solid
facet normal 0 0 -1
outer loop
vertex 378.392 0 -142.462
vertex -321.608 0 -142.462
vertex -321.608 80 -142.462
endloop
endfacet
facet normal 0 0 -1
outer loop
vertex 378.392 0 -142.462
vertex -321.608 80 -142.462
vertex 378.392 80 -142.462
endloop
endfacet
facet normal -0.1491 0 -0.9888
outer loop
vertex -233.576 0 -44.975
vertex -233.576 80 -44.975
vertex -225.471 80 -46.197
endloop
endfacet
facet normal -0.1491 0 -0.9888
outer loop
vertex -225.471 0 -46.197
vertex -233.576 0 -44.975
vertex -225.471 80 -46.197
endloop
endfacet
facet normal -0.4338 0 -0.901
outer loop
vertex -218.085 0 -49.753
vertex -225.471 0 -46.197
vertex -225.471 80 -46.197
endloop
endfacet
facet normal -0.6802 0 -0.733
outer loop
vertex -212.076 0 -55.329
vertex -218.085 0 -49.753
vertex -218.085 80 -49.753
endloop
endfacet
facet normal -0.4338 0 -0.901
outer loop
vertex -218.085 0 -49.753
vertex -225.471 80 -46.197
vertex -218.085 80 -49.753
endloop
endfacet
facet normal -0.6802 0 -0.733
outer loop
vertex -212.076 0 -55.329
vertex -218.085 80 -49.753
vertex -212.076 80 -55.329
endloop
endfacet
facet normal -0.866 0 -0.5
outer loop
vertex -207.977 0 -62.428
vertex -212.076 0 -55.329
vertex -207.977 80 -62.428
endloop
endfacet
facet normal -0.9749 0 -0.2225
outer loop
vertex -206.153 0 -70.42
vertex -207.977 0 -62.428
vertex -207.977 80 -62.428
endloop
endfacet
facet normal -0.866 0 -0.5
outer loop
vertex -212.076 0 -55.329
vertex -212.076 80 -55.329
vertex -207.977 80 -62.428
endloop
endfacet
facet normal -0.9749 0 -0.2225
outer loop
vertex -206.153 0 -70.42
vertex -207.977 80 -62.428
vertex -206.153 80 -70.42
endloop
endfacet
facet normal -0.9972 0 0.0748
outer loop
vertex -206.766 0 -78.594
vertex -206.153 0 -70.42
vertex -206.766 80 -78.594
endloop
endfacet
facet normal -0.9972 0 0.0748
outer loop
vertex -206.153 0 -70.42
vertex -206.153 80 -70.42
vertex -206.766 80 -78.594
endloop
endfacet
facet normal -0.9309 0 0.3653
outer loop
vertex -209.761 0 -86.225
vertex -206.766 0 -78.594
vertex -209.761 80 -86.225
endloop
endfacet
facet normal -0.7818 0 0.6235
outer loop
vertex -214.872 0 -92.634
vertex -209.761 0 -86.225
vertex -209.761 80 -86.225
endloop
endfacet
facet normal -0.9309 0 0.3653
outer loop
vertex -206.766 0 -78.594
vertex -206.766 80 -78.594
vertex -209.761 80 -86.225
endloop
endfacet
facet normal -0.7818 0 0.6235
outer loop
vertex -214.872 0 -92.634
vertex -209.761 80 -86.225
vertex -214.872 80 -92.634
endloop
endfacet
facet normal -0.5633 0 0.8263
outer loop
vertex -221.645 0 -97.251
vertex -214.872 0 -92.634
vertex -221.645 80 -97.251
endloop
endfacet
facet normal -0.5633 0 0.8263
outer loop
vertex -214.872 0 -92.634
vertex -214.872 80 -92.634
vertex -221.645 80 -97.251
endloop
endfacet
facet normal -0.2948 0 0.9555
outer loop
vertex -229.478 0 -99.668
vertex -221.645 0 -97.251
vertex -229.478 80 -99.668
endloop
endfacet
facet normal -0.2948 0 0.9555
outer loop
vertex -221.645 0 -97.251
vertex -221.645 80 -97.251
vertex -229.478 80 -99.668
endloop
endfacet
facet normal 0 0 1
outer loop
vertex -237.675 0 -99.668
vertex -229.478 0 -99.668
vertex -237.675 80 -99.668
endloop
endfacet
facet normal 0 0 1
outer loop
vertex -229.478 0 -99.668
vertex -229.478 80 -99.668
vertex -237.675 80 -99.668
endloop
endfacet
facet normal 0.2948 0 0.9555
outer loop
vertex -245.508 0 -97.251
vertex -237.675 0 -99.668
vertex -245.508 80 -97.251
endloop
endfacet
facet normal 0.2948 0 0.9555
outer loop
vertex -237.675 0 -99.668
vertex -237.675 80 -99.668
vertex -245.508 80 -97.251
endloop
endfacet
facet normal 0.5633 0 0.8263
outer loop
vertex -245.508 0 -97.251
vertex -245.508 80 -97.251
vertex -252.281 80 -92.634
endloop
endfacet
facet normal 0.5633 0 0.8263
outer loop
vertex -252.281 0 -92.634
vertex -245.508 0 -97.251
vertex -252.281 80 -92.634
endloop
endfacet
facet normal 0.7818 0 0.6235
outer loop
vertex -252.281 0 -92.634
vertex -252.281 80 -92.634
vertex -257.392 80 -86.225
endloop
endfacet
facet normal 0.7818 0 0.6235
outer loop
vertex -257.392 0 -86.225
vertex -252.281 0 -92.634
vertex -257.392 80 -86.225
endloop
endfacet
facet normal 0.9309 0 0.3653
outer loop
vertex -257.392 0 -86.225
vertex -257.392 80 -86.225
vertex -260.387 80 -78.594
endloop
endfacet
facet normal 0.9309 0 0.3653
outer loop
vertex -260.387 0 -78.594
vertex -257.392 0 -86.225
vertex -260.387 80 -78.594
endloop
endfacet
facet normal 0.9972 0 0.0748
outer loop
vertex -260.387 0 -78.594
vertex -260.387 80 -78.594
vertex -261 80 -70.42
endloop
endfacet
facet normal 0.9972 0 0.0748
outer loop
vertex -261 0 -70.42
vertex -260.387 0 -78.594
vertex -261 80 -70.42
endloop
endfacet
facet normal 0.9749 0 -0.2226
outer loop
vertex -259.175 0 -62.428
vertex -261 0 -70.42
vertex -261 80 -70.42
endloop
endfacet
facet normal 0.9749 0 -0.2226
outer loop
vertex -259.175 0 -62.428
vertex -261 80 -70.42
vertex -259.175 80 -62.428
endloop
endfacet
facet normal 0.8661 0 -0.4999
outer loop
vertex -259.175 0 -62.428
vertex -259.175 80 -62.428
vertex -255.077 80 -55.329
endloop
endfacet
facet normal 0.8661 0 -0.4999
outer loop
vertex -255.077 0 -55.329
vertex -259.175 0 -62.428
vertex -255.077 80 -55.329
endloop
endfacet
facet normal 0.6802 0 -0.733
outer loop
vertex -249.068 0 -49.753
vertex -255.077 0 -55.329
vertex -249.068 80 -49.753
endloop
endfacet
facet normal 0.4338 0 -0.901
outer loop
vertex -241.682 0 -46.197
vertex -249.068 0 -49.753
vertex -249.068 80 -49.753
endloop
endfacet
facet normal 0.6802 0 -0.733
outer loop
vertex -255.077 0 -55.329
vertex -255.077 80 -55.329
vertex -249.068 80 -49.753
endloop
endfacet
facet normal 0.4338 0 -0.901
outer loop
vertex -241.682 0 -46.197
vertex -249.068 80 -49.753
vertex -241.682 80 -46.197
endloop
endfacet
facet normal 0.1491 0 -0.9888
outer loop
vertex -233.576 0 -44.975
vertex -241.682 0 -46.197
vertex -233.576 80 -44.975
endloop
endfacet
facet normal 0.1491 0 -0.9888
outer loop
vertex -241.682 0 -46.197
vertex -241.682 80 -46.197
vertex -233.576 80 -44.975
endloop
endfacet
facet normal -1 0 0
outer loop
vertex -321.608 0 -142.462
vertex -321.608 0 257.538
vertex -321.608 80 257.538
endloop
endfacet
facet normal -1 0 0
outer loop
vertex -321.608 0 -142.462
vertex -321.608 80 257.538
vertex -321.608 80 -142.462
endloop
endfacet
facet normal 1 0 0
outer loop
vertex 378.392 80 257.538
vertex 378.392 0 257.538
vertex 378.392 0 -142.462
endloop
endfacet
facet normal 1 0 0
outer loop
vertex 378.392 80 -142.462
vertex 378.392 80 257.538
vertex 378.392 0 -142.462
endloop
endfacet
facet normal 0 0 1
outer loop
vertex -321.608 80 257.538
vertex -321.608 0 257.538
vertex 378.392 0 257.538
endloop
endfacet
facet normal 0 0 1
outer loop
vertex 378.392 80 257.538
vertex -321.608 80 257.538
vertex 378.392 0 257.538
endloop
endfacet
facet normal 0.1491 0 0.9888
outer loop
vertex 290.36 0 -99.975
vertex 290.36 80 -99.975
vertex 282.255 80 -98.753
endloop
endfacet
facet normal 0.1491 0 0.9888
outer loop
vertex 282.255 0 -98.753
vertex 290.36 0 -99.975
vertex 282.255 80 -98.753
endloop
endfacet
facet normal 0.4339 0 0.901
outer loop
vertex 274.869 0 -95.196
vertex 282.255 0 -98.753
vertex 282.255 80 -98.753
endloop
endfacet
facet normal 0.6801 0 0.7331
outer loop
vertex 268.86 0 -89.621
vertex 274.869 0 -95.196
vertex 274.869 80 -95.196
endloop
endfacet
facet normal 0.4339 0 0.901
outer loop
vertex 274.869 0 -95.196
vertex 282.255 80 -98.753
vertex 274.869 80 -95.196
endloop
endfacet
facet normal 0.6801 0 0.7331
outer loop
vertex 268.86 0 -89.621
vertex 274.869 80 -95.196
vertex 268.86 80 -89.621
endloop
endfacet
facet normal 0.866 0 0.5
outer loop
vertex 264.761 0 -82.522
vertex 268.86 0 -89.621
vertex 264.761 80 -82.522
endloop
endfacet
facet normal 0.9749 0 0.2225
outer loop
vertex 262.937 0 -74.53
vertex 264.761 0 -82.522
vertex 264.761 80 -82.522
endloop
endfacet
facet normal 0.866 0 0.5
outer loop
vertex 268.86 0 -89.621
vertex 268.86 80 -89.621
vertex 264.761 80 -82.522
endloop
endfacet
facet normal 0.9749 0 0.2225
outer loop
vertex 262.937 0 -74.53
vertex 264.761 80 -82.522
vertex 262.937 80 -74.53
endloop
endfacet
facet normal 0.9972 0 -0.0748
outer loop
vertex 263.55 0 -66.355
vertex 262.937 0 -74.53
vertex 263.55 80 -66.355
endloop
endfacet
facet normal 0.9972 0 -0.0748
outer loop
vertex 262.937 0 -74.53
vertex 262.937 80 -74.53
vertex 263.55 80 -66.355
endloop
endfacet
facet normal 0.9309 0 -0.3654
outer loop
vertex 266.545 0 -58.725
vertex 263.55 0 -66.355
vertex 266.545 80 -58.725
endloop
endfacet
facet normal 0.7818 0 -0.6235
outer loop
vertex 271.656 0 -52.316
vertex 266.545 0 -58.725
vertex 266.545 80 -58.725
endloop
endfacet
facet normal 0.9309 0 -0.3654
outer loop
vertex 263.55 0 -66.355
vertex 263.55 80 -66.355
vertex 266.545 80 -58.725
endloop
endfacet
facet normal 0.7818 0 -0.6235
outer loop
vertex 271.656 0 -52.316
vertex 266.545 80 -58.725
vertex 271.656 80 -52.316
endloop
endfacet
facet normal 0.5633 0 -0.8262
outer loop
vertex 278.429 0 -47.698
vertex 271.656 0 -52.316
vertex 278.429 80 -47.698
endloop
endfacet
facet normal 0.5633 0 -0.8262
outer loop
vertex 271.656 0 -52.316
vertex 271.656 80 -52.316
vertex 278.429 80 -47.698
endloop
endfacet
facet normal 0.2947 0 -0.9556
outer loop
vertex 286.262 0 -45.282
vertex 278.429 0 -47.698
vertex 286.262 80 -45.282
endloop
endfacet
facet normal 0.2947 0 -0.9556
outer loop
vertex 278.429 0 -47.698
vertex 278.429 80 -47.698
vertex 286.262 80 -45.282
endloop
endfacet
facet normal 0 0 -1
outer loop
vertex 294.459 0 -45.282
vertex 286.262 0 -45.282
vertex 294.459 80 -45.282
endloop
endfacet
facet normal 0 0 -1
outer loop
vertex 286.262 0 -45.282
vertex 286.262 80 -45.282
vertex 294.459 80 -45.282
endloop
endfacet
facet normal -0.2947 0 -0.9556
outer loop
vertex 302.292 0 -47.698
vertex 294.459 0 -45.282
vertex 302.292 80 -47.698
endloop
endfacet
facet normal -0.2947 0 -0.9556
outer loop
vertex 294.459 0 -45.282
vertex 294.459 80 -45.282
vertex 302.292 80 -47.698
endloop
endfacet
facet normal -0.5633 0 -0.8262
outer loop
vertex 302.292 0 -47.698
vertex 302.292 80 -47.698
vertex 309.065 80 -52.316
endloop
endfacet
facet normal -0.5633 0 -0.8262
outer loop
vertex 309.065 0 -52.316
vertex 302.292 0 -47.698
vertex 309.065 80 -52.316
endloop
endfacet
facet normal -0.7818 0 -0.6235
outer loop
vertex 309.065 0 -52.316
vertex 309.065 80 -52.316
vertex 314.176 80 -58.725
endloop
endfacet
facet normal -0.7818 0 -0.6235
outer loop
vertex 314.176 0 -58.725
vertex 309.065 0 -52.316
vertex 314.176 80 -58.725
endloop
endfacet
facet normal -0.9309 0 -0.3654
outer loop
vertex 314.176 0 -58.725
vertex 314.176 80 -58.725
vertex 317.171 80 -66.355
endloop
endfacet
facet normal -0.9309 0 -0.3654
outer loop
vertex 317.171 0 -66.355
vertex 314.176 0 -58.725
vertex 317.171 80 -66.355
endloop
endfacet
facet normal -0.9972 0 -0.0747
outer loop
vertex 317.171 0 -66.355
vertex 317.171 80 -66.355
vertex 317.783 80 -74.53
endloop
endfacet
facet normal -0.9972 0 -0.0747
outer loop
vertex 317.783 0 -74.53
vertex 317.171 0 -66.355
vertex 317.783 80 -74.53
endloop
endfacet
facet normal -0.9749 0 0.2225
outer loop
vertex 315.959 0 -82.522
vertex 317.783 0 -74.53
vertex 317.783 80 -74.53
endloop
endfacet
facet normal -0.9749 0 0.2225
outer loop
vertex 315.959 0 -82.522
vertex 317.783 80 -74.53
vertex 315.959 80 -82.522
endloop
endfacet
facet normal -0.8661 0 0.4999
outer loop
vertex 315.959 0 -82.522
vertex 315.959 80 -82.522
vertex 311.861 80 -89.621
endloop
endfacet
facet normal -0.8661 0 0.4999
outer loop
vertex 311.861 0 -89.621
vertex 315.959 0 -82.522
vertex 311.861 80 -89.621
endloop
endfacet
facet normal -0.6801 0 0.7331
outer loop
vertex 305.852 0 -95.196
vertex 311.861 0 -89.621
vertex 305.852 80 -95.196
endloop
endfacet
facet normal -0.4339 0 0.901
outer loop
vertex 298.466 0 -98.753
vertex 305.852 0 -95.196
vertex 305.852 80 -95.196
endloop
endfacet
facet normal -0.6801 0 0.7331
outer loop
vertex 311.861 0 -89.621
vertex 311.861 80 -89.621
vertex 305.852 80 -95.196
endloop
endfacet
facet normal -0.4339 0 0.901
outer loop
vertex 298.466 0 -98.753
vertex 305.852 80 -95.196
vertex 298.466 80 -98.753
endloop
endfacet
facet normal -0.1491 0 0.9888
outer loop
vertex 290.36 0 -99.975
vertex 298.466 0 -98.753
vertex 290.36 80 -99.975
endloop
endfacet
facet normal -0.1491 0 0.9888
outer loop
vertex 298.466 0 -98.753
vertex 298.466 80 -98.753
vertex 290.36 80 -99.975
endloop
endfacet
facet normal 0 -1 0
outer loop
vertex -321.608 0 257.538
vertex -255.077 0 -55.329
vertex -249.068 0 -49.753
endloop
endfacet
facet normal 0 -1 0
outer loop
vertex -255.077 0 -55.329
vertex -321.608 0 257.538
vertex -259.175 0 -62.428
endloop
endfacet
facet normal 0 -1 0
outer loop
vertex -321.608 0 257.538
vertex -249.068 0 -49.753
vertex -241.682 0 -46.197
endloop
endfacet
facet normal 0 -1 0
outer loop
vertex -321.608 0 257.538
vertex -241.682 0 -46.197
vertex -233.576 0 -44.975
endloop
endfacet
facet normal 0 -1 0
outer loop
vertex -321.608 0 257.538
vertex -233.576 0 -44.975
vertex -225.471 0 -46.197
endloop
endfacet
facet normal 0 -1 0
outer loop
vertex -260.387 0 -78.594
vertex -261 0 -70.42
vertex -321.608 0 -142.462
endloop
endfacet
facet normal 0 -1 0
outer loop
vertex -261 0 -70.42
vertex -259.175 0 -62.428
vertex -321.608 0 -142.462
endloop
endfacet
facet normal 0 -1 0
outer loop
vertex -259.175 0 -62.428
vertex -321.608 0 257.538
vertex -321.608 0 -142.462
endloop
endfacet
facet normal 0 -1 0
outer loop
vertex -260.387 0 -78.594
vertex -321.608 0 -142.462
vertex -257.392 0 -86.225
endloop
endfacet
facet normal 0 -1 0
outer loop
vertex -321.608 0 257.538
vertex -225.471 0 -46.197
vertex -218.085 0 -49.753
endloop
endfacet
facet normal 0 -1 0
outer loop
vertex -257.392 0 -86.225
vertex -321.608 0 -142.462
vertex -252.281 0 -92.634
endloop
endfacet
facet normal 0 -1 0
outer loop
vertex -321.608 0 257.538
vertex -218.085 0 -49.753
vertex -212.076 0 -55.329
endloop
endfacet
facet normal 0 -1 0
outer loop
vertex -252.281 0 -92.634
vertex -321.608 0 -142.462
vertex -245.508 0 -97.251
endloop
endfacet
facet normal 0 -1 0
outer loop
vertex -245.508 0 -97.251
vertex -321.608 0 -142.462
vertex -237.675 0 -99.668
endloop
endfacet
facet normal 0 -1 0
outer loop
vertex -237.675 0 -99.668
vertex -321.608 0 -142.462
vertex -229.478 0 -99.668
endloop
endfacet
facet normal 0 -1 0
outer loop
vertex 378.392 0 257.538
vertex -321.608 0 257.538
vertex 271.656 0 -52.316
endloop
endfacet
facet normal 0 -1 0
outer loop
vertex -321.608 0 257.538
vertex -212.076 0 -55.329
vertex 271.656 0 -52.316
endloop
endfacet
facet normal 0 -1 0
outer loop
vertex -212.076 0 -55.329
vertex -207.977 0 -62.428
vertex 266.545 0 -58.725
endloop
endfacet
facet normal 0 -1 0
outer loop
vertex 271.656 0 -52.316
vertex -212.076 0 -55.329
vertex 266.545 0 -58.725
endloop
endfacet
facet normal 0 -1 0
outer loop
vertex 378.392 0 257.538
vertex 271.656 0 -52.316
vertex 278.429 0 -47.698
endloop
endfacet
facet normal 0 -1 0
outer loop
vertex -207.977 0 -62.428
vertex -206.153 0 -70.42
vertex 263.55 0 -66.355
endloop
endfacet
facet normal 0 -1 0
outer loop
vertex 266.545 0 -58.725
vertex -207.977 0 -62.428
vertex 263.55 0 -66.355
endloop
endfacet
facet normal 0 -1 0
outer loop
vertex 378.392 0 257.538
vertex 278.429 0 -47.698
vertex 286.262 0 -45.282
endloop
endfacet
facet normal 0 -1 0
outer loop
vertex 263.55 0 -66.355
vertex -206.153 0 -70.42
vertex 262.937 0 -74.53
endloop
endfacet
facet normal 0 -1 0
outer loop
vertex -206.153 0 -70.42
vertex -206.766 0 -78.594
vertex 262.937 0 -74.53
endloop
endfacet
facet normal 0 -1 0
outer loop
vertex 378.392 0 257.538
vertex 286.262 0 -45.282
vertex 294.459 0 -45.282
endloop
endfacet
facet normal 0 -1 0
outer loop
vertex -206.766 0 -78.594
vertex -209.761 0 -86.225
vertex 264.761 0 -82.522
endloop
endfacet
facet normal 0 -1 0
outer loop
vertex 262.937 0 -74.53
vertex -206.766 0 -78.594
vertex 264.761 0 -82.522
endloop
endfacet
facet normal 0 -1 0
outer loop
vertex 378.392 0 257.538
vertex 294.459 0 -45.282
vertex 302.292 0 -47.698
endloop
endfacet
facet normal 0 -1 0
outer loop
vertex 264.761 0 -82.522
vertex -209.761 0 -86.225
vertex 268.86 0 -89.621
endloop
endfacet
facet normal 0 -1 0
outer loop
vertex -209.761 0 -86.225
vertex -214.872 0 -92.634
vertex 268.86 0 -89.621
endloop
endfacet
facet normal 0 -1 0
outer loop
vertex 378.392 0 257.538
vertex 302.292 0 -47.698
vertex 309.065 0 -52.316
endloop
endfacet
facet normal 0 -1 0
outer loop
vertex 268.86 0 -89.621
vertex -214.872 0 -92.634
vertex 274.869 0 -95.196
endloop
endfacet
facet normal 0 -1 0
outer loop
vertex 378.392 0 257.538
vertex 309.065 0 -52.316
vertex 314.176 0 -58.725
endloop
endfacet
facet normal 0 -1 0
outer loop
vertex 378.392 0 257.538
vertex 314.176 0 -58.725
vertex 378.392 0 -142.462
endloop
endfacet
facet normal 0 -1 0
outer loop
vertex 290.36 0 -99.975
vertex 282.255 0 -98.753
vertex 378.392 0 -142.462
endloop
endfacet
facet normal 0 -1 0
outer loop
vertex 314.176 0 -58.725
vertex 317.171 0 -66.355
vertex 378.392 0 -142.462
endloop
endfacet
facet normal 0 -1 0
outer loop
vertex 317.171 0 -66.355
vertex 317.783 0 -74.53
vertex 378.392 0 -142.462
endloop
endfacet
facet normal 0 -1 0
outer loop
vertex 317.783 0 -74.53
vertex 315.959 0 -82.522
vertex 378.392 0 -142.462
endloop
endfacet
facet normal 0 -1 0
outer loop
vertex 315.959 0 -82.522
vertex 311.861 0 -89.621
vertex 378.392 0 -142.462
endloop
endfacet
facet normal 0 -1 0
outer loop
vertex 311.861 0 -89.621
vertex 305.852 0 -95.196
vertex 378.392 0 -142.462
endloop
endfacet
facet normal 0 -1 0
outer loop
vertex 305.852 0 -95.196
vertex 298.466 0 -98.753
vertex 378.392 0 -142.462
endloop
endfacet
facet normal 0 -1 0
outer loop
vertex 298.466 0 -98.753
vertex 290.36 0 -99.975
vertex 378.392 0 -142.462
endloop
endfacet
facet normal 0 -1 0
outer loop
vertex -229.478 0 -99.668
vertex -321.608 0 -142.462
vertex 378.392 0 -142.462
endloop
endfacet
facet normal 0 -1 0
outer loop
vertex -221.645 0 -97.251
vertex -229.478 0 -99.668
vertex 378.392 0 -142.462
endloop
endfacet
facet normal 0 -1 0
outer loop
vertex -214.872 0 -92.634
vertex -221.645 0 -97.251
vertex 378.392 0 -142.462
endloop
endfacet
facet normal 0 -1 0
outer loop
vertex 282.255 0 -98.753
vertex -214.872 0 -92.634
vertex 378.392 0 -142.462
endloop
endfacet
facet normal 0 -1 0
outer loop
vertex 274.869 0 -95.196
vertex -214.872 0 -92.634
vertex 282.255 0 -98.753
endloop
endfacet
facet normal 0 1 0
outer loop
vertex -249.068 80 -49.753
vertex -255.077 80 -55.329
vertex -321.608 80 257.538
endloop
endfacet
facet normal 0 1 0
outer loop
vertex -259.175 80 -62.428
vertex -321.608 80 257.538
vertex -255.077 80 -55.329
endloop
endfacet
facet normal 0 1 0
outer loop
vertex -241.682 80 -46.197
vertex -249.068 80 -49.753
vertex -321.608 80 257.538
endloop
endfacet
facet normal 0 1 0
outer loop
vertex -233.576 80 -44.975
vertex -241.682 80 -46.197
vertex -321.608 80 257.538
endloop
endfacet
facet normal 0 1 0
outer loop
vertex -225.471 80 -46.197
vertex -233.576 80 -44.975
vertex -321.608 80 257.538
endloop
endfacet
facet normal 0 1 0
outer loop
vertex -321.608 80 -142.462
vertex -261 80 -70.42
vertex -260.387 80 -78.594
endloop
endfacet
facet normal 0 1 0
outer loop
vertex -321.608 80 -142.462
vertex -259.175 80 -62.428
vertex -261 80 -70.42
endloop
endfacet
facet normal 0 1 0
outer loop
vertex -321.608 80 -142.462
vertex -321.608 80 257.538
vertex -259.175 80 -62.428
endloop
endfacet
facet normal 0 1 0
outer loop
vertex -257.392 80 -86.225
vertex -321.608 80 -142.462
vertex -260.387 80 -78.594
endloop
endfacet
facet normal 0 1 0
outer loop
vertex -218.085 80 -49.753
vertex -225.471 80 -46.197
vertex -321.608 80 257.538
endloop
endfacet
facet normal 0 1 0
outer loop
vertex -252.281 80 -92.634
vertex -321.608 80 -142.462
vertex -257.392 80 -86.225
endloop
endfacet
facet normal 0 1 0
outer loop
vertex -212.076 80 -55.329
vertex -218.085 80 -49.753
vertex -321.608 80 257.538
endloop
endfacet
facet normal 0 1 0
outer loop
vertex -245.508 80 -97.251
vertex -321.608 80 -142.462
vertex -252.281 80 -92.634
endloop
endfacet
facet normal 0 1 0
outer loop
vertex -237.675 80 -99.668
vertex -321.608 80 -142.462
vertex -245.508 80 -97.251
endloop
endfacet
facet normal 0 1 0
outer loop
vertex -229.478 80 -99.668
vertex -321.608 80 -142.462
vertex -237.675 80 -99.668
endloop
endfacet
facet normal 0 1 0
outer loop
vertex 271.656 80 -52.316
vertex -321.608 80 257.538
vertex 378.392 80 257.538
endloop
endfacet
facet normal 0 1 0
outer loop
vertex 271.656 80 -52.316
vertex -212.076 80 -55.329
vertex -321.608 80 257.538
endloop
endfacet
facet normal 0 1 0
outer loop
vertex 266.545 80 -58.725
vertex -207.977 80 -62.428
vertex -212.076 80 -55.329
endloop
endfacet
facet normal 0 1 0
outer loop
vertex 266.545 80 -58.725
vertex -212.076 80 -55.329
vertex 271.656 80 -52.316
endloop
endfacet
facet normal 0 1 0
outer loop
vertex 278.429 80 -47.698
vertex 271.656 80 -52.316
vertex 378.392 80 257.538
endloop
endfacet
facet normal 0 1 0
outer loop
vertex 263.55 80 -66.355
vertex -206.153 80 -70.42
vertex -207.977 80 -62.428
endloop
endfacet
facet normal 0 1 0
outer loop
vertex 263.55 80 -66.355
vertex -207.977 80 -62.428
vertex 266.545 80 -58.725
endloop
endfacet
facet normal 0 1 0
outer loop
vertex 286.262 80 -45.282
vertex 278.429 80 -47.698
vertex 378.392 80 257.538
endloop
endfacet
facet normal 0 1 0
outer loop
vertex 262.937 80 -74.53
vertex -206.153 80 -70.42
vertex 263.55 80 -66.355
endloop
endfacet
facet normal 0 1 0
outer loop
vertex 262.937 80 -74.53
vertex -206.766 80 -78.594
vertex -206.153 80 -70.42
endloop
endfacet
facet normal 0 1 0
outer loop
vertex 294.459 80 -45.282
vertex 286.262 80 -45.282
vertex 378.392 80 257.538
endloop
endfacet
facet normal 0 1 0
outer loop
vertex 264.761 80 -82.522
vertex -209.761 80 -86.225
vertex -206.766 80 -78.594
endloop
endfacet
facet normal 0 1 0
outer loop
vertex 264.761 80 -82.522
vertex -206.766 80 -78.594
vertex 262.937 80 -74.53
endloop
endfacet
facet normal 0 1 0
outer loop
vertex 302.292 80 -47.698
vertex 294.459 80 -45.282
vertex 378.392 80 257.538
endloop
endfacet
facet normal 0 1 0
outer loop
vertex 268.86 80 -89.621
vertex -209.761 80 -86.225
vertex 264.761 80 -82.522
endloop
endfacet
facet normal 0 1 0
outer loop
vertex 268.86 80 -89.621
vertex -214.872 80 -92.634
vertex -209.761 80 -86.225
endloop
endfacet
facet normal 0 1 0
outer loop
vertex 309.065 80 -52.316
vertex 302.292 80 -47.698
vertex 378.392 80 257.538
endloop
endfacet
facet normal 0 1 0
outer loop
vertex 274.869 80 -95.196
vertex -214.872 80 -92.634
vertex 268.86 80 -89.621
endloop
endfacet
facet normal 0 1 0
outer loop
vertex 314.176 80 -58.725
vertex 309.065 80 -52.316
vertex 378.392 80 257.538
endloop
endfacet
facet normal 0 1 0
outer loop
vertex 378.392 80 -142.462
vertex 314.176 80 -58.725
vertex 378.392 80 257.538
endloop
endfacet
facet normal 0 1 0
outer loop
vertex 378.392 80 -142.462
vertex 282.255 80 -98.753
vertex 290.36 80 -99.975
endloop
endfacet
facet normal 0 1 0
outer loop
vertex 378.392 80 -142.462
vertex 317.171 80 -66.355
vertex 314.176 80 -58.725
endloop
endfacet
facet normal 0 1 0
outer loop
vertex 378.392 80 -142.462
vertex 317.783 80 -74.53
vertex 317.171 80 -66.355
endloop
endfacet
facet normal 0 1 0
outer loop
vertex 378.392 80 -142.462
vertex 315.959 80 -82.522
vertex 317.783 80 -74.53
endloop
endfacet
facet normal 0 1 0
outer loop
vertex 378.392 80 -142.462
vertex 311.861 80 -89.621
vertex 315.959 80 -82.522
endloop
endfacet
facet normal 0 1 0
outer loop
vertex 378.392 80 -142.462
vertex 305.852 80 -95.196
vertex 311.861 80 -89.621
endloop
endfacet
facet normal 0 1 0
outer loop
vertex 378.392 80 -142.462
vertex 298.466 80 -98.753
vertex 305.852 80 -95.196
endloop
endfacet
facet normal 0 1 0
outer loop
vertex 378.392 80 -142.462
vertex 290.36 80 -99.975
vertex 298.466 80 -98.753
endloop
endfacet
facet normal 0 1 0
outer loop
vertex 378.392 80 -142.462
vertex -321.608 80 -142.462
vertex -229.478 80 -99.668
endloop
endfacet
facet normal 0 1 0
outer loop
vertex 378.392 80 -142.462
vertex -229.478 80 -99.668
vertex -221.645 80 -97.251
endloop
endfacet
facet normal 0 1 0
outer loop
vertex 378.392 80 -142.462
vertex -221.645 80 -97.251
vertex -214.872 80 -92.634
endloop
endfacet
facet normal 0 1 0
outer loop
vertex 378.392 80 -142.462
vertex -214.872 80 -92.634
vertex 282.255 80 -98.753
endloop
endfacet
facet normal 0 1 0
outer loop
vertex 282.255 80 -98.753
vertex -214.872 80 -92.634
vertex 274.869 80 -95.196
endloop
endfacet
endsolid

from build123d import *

# Parameters (mm, degrees)
SKETCH1_W           = 700
SKETCH1_H           = 400
BOSS_EXTRUDE1_DEPTH = 80
SKETCH3_R           = 27.5
CUT_EXTRUDE1_DEPTH  = 80
SKETCH3_4_R         = 27.5
CUT_EXTRUDE2_DEPTH  = 80


with BuildPart() as part:
    # Sketch1 → Boss-Extrude1 (new body)
    with BuildSketch(Plane(origin=(0, 0, 0), x_dir=(1, 0, 0), z_dir=(0, 1, 0))):
        with Locations((28.391959799, -57.537688442)):
            Rectangle(SKETCH1_W, SKETCH1_H)
    extrude(amount=BOSS_EXTRUDE1_DEPTH)

    # Sketch3 → Cut-Extrude1 (cut)
    with BuildSketch(Plane(origin=(0, 80, 0), x_dir=(1, 0, 0), z_dir=(0, 1, 0))):
        with Locations((-233.57645152, 72.474774931)):
            Circle(SKETCH3_R)
    extrude(amount=-CUT_EXTRUDE1_DEPTH, mode=Mode.SUBTRACT)

    # Sketch3<4> → Cut-Extrude2 (cut)
    with BuildSketch(Plane(origin=(0, 80, 0), x_dir=(1, 0, 0), z_dir=(0, 1, 0))):
        with Locations((290.360371117, 72.474774931)):
            Circle(SKETCH3_4_R)
    extrude(amount=-CUT_EXTRUDE2_DEPTH, mode=Mode.SUBTRACT)


solid = part.part
